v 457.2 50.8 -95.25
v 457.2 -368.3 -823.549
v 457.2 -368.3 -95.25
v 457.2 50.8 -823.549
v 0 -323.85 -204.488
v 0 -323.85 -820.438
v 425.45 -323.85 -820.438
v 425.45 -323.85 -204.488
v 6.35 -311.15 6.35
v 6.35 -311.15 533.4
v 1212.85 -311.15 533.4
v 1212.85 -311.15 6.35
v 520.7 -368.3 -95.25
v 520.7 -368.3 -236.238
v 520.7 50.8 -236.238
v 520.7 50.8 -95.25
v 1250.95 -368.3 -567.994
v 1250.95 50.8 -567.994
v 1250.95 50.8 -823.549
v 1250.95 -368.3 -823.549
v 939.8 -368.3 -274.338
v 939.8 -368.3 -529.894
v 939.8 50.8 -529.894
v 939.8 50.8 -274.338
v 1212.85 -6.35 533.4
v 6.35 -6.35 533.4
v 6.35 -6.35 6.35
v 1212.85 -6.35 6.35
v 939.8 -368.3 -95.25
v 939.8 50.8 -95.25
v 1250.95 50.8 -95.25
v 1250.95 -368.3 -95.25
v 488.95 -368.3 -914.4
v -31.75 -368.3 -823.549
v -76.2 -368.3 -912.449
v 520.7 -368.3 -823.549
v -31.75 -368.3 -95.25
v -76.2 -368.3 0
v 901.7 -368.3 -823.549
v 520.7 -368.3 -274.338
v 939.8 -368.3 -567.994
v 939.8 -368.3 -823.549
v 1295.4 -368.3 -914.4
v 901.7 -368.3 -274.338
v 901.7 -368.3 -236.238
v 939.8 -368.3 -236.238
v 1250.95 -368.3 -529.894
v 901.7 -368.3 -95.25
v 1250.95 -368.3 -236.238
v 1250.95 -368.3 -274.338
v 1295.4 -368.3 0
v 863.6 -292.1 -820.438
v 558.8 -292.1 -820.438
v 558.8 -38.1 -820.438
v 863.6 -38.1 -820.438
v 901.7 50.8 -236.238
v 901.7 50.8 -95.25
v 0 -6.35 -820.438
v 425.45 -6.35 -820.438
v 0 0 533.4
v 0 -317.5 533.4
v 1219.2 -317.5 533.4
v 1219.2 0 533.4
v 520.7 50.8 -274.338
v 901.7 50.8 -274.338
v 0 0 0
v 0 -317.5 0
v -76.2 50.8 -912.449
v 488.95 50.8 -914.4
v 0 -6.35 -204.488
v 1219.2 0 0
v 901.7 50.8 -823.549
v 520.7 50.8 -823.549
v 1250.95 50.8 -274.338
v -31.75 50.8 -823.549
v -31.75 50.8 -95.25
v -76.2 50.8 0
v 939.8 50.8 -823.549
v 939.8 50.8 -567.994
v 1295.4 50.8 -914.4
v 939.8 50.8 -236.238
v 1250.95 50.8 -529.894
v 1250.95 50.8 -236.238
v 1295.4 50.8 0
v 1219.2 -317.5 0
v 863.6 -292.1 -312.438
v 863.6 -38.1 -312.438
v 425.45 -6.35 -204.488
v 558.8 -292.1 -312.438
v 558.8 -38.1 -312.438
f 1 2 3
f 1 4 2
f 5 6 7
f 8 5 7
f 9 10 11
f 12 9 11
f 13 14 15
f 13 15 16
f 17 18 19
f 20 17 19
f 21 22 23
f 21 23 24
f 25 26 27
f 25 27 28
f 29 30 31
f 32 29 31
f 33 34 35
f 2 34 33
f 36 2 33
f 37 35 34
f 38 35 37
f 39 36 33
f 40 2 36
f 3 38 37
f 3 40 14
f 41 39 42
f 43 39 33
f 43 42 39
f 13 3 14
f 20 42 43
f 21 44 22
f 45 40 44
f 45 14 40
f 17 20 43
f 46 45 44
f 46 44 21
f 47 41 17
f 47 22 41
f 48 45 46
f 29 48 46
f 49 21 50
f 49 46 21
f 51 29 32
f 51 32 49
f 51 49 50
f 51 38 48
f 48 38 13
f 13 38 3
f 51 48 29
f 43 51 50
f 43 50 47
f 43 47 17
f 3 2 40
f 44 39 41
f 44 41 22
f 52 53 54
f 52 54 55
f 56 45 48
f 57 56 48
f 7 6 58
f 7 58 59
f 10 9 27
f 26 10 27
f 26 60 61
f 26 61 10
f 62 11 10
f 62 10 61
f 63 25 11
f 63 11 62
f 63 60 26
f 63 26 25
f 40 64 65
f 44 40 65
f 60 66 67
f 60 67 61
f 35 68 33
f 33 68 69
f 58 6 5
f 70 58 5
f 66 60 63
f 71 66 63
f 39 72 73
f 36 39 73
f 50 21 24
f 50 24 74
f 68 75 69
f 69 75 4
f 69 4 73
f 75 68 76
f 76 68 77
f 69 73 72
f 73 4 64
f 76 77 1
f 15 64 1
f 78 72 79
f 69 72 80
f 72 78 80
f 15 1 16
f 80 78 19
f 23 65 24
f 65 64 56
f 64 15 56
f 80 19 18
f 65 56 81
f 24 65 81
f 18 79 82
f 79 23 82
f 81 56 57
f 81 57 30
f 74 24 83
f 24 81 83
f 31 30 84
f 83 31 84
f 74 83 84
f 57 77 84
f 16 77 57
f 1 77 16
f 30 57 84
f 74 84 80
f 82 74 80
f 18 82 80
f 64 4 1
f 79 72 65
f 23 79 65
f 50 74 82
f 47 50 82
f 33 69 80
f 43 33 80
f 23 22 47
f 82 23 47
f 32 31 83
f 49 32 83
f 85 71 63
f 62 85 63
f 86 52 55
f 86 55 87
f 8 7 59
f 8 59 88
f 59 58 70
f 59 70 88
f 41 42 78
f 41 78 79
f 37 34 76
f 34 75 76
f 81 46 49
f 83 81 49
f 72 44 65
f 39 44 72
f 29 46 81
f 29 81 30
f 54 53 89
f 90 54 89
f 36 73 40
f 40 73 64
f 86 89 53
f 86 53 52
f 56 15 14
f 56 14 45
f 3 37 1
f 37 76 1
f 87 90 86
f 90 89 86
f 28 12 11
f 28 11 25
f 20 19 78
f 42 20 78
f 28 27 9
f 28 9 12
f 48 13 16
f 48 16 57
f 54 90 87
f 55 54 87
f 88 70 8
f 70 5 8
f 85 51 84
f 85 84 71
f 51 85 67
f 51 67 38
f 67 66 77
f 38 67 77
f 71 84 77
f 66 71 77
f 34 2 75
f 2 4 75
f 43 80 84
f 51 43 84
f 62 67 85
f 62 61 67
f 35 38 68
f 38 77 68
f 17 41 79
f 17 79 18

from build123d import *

# Parameters (mm, degrees)
F0_W           = 1219.2
F0_H           = 533.4
F1_DEPTH       = 317.5
F2_W           = 1206.5
F2_H           = 304.8
F3_DEPTH       = 527.05
F4_W           = 44.45
F4_H           = 728.299479103
F4_W_2         = 31.75
F4_H_2         = 90.850520897
F4_H_3         = 95.25
F5_DEPTH       = 368.3
F5_DEPTH_BACK  = 50.8
F8_W           = 425.45
F8_H           = 615.95
F9_DEPTH       = 158.75
F9_DEPTH_BACK  = 158.75
F10_W          = 304.8
F10_H          = 508
F11_DEPTH      = 127
F11_DEPTH_BACK = 127
F12_W          = 381
F12_H          = 38.1
F12_W_2        = 38.1
F12_H_2        = 140.987979103
F12_W_3        = 311.15
F13_DEPTH      = 419.1


with BuildPart() as f1:
    # F0 (on Front) → F1 (new body)
    with BuildSketch(Plane.XZ):
        with Locations((609.6, 266.7)):
            Rectangle(F0_W, F0_H)
    extrude(amount=F1_DEPTH)

    # F2 (on face) → F3 (cut)
    with BuildSketch(Plane.XY.offset(533.4)):
        with Locations((609.6, -158.75)):
            Rectangle(F2_W, F2_H)
    extrude(amount=-F3_DEPTH, mode=Mode.SUBTRACT)

    # F4 (on face) → F5 (join, two sides)
    with BuildSketch(Plane.XZ.offset(317.5)) as f5_sk:
        with Locations((-53.975, -459.3997395515)):
            Rectangle(F4_W, F4_H)
        Polygon((-31.75, -823.549479103), (-76.2, -823.549479103), (-76.2, -912.449479103), (457.2, -914.2904201743), (457.2, -823.549479103), align=None)
        with Locations((473.075, -459.3997395515)):
            Rectangle(F4_W_2, F4_H)
        with Locations((504.825, -459.3997395515)):
            Rectangle(F4_W_2, F4_H)
        Polygon((488.95, -823.549479103), (457.2, -823.549479103), (457.2, -914.2904201743), (488.95, -914.4), align=None)
        Polygon((520.7, -823.549479103), (488.95, -823.549479103), (488.95, -914.4), (1250.95, -914.4), (1250.95, -823.549479103), align=None)
        with Locations((1273.175, -868.9747395515)):
            Rectangle(F4_W, F4_H_2)
        with Locations((1273.175, -459.3997395515)):
            Rectangle(F4_W, F4_H)
        with Locations((1273.175, -47.625)):
            Rectangle(F4_W, F4_H_3)
        Polygon((1219.2, 0), (520.7, 0), (520.7, -95.25), (1250.95, -95.25), (1250.95, 0), align=None)
        Polygon((0, 0), (-31.75, 0), (-31.75, -95.25), (457.2, -95.25), (457.2, 0), align=None)
        with Locations((-53.975, -47.625)):
            Rectangle(F4_W, F4_H_3)
        with Locations((504.825, -47.625)):
            Rectangle(F4_W_2, F4_H_3)
        with Locations((473.075, -47.625)):
            Rectangle(F4_W_2, F4_H_3)
    extrude(amount=-F5_DEPTH)
    extrude(f5_sk.sketch, amount=F5_DEPTH_BACK)

    # F12 (on face) → F13 (join, through all)
    with BuildSketch(Plane.XZ.offset(368.3)):
        with Locations((711.2, -255.287979103)):
            Rectangle(F12_W, F12_H)
        with Locations((920.75, -165.7439895515)):
            Rectangle(F12_W_2, F12_H_2)
        with Locations((920.75, -255.287979103)):
            Rectangle(F12_W_2, F12_H)
        with Locations((1095.375, -255.287979103)):
            Rectangle(F12_W_3, F12_H)
        Polygon((939.8, -274.337979103), (901.7, -274.337979103), (901.7, -823.549479103), (939.8, -823.549479103), (939.8, -567.993729103), (939.8, -529.893729103), align=None)
        with Locations((1095.375, -548.943729103)):
            Rectangle(F12_W_3, F12_H)
    extrude(amount=-F13_DEPTH)


with BuildPart() as f9:
    # F8 (on face) → F9 (new body, two sides)
    with BuildSketch(Plane.XZ.offset(165.1)) as f9_sk:
        with Locations((212.725, -512.462979103)):
            Rectangle(F8_W, F8_H)
    extrude(amount=F9_DEPTH)
    extrude(f9_sk.sketch, amount=-F9_DEPTH_BACK)


with BuildPart() as f11:
    # F10 (on face) → F11 (new body, two sides)
    with BuildSketch(Plane.XZ.offset(165.1)) as f11_sk:
        with Locations((711.2, -566.437979103)):
            Rectangle(F10_W, F10_H)
    extrude(amount=F11_DEPTH)
    extrude(f11_sk.sketch, amount=-F11_DEPTH_BACK)


solid = Compound([f1.part, f9.part, f11.part])
